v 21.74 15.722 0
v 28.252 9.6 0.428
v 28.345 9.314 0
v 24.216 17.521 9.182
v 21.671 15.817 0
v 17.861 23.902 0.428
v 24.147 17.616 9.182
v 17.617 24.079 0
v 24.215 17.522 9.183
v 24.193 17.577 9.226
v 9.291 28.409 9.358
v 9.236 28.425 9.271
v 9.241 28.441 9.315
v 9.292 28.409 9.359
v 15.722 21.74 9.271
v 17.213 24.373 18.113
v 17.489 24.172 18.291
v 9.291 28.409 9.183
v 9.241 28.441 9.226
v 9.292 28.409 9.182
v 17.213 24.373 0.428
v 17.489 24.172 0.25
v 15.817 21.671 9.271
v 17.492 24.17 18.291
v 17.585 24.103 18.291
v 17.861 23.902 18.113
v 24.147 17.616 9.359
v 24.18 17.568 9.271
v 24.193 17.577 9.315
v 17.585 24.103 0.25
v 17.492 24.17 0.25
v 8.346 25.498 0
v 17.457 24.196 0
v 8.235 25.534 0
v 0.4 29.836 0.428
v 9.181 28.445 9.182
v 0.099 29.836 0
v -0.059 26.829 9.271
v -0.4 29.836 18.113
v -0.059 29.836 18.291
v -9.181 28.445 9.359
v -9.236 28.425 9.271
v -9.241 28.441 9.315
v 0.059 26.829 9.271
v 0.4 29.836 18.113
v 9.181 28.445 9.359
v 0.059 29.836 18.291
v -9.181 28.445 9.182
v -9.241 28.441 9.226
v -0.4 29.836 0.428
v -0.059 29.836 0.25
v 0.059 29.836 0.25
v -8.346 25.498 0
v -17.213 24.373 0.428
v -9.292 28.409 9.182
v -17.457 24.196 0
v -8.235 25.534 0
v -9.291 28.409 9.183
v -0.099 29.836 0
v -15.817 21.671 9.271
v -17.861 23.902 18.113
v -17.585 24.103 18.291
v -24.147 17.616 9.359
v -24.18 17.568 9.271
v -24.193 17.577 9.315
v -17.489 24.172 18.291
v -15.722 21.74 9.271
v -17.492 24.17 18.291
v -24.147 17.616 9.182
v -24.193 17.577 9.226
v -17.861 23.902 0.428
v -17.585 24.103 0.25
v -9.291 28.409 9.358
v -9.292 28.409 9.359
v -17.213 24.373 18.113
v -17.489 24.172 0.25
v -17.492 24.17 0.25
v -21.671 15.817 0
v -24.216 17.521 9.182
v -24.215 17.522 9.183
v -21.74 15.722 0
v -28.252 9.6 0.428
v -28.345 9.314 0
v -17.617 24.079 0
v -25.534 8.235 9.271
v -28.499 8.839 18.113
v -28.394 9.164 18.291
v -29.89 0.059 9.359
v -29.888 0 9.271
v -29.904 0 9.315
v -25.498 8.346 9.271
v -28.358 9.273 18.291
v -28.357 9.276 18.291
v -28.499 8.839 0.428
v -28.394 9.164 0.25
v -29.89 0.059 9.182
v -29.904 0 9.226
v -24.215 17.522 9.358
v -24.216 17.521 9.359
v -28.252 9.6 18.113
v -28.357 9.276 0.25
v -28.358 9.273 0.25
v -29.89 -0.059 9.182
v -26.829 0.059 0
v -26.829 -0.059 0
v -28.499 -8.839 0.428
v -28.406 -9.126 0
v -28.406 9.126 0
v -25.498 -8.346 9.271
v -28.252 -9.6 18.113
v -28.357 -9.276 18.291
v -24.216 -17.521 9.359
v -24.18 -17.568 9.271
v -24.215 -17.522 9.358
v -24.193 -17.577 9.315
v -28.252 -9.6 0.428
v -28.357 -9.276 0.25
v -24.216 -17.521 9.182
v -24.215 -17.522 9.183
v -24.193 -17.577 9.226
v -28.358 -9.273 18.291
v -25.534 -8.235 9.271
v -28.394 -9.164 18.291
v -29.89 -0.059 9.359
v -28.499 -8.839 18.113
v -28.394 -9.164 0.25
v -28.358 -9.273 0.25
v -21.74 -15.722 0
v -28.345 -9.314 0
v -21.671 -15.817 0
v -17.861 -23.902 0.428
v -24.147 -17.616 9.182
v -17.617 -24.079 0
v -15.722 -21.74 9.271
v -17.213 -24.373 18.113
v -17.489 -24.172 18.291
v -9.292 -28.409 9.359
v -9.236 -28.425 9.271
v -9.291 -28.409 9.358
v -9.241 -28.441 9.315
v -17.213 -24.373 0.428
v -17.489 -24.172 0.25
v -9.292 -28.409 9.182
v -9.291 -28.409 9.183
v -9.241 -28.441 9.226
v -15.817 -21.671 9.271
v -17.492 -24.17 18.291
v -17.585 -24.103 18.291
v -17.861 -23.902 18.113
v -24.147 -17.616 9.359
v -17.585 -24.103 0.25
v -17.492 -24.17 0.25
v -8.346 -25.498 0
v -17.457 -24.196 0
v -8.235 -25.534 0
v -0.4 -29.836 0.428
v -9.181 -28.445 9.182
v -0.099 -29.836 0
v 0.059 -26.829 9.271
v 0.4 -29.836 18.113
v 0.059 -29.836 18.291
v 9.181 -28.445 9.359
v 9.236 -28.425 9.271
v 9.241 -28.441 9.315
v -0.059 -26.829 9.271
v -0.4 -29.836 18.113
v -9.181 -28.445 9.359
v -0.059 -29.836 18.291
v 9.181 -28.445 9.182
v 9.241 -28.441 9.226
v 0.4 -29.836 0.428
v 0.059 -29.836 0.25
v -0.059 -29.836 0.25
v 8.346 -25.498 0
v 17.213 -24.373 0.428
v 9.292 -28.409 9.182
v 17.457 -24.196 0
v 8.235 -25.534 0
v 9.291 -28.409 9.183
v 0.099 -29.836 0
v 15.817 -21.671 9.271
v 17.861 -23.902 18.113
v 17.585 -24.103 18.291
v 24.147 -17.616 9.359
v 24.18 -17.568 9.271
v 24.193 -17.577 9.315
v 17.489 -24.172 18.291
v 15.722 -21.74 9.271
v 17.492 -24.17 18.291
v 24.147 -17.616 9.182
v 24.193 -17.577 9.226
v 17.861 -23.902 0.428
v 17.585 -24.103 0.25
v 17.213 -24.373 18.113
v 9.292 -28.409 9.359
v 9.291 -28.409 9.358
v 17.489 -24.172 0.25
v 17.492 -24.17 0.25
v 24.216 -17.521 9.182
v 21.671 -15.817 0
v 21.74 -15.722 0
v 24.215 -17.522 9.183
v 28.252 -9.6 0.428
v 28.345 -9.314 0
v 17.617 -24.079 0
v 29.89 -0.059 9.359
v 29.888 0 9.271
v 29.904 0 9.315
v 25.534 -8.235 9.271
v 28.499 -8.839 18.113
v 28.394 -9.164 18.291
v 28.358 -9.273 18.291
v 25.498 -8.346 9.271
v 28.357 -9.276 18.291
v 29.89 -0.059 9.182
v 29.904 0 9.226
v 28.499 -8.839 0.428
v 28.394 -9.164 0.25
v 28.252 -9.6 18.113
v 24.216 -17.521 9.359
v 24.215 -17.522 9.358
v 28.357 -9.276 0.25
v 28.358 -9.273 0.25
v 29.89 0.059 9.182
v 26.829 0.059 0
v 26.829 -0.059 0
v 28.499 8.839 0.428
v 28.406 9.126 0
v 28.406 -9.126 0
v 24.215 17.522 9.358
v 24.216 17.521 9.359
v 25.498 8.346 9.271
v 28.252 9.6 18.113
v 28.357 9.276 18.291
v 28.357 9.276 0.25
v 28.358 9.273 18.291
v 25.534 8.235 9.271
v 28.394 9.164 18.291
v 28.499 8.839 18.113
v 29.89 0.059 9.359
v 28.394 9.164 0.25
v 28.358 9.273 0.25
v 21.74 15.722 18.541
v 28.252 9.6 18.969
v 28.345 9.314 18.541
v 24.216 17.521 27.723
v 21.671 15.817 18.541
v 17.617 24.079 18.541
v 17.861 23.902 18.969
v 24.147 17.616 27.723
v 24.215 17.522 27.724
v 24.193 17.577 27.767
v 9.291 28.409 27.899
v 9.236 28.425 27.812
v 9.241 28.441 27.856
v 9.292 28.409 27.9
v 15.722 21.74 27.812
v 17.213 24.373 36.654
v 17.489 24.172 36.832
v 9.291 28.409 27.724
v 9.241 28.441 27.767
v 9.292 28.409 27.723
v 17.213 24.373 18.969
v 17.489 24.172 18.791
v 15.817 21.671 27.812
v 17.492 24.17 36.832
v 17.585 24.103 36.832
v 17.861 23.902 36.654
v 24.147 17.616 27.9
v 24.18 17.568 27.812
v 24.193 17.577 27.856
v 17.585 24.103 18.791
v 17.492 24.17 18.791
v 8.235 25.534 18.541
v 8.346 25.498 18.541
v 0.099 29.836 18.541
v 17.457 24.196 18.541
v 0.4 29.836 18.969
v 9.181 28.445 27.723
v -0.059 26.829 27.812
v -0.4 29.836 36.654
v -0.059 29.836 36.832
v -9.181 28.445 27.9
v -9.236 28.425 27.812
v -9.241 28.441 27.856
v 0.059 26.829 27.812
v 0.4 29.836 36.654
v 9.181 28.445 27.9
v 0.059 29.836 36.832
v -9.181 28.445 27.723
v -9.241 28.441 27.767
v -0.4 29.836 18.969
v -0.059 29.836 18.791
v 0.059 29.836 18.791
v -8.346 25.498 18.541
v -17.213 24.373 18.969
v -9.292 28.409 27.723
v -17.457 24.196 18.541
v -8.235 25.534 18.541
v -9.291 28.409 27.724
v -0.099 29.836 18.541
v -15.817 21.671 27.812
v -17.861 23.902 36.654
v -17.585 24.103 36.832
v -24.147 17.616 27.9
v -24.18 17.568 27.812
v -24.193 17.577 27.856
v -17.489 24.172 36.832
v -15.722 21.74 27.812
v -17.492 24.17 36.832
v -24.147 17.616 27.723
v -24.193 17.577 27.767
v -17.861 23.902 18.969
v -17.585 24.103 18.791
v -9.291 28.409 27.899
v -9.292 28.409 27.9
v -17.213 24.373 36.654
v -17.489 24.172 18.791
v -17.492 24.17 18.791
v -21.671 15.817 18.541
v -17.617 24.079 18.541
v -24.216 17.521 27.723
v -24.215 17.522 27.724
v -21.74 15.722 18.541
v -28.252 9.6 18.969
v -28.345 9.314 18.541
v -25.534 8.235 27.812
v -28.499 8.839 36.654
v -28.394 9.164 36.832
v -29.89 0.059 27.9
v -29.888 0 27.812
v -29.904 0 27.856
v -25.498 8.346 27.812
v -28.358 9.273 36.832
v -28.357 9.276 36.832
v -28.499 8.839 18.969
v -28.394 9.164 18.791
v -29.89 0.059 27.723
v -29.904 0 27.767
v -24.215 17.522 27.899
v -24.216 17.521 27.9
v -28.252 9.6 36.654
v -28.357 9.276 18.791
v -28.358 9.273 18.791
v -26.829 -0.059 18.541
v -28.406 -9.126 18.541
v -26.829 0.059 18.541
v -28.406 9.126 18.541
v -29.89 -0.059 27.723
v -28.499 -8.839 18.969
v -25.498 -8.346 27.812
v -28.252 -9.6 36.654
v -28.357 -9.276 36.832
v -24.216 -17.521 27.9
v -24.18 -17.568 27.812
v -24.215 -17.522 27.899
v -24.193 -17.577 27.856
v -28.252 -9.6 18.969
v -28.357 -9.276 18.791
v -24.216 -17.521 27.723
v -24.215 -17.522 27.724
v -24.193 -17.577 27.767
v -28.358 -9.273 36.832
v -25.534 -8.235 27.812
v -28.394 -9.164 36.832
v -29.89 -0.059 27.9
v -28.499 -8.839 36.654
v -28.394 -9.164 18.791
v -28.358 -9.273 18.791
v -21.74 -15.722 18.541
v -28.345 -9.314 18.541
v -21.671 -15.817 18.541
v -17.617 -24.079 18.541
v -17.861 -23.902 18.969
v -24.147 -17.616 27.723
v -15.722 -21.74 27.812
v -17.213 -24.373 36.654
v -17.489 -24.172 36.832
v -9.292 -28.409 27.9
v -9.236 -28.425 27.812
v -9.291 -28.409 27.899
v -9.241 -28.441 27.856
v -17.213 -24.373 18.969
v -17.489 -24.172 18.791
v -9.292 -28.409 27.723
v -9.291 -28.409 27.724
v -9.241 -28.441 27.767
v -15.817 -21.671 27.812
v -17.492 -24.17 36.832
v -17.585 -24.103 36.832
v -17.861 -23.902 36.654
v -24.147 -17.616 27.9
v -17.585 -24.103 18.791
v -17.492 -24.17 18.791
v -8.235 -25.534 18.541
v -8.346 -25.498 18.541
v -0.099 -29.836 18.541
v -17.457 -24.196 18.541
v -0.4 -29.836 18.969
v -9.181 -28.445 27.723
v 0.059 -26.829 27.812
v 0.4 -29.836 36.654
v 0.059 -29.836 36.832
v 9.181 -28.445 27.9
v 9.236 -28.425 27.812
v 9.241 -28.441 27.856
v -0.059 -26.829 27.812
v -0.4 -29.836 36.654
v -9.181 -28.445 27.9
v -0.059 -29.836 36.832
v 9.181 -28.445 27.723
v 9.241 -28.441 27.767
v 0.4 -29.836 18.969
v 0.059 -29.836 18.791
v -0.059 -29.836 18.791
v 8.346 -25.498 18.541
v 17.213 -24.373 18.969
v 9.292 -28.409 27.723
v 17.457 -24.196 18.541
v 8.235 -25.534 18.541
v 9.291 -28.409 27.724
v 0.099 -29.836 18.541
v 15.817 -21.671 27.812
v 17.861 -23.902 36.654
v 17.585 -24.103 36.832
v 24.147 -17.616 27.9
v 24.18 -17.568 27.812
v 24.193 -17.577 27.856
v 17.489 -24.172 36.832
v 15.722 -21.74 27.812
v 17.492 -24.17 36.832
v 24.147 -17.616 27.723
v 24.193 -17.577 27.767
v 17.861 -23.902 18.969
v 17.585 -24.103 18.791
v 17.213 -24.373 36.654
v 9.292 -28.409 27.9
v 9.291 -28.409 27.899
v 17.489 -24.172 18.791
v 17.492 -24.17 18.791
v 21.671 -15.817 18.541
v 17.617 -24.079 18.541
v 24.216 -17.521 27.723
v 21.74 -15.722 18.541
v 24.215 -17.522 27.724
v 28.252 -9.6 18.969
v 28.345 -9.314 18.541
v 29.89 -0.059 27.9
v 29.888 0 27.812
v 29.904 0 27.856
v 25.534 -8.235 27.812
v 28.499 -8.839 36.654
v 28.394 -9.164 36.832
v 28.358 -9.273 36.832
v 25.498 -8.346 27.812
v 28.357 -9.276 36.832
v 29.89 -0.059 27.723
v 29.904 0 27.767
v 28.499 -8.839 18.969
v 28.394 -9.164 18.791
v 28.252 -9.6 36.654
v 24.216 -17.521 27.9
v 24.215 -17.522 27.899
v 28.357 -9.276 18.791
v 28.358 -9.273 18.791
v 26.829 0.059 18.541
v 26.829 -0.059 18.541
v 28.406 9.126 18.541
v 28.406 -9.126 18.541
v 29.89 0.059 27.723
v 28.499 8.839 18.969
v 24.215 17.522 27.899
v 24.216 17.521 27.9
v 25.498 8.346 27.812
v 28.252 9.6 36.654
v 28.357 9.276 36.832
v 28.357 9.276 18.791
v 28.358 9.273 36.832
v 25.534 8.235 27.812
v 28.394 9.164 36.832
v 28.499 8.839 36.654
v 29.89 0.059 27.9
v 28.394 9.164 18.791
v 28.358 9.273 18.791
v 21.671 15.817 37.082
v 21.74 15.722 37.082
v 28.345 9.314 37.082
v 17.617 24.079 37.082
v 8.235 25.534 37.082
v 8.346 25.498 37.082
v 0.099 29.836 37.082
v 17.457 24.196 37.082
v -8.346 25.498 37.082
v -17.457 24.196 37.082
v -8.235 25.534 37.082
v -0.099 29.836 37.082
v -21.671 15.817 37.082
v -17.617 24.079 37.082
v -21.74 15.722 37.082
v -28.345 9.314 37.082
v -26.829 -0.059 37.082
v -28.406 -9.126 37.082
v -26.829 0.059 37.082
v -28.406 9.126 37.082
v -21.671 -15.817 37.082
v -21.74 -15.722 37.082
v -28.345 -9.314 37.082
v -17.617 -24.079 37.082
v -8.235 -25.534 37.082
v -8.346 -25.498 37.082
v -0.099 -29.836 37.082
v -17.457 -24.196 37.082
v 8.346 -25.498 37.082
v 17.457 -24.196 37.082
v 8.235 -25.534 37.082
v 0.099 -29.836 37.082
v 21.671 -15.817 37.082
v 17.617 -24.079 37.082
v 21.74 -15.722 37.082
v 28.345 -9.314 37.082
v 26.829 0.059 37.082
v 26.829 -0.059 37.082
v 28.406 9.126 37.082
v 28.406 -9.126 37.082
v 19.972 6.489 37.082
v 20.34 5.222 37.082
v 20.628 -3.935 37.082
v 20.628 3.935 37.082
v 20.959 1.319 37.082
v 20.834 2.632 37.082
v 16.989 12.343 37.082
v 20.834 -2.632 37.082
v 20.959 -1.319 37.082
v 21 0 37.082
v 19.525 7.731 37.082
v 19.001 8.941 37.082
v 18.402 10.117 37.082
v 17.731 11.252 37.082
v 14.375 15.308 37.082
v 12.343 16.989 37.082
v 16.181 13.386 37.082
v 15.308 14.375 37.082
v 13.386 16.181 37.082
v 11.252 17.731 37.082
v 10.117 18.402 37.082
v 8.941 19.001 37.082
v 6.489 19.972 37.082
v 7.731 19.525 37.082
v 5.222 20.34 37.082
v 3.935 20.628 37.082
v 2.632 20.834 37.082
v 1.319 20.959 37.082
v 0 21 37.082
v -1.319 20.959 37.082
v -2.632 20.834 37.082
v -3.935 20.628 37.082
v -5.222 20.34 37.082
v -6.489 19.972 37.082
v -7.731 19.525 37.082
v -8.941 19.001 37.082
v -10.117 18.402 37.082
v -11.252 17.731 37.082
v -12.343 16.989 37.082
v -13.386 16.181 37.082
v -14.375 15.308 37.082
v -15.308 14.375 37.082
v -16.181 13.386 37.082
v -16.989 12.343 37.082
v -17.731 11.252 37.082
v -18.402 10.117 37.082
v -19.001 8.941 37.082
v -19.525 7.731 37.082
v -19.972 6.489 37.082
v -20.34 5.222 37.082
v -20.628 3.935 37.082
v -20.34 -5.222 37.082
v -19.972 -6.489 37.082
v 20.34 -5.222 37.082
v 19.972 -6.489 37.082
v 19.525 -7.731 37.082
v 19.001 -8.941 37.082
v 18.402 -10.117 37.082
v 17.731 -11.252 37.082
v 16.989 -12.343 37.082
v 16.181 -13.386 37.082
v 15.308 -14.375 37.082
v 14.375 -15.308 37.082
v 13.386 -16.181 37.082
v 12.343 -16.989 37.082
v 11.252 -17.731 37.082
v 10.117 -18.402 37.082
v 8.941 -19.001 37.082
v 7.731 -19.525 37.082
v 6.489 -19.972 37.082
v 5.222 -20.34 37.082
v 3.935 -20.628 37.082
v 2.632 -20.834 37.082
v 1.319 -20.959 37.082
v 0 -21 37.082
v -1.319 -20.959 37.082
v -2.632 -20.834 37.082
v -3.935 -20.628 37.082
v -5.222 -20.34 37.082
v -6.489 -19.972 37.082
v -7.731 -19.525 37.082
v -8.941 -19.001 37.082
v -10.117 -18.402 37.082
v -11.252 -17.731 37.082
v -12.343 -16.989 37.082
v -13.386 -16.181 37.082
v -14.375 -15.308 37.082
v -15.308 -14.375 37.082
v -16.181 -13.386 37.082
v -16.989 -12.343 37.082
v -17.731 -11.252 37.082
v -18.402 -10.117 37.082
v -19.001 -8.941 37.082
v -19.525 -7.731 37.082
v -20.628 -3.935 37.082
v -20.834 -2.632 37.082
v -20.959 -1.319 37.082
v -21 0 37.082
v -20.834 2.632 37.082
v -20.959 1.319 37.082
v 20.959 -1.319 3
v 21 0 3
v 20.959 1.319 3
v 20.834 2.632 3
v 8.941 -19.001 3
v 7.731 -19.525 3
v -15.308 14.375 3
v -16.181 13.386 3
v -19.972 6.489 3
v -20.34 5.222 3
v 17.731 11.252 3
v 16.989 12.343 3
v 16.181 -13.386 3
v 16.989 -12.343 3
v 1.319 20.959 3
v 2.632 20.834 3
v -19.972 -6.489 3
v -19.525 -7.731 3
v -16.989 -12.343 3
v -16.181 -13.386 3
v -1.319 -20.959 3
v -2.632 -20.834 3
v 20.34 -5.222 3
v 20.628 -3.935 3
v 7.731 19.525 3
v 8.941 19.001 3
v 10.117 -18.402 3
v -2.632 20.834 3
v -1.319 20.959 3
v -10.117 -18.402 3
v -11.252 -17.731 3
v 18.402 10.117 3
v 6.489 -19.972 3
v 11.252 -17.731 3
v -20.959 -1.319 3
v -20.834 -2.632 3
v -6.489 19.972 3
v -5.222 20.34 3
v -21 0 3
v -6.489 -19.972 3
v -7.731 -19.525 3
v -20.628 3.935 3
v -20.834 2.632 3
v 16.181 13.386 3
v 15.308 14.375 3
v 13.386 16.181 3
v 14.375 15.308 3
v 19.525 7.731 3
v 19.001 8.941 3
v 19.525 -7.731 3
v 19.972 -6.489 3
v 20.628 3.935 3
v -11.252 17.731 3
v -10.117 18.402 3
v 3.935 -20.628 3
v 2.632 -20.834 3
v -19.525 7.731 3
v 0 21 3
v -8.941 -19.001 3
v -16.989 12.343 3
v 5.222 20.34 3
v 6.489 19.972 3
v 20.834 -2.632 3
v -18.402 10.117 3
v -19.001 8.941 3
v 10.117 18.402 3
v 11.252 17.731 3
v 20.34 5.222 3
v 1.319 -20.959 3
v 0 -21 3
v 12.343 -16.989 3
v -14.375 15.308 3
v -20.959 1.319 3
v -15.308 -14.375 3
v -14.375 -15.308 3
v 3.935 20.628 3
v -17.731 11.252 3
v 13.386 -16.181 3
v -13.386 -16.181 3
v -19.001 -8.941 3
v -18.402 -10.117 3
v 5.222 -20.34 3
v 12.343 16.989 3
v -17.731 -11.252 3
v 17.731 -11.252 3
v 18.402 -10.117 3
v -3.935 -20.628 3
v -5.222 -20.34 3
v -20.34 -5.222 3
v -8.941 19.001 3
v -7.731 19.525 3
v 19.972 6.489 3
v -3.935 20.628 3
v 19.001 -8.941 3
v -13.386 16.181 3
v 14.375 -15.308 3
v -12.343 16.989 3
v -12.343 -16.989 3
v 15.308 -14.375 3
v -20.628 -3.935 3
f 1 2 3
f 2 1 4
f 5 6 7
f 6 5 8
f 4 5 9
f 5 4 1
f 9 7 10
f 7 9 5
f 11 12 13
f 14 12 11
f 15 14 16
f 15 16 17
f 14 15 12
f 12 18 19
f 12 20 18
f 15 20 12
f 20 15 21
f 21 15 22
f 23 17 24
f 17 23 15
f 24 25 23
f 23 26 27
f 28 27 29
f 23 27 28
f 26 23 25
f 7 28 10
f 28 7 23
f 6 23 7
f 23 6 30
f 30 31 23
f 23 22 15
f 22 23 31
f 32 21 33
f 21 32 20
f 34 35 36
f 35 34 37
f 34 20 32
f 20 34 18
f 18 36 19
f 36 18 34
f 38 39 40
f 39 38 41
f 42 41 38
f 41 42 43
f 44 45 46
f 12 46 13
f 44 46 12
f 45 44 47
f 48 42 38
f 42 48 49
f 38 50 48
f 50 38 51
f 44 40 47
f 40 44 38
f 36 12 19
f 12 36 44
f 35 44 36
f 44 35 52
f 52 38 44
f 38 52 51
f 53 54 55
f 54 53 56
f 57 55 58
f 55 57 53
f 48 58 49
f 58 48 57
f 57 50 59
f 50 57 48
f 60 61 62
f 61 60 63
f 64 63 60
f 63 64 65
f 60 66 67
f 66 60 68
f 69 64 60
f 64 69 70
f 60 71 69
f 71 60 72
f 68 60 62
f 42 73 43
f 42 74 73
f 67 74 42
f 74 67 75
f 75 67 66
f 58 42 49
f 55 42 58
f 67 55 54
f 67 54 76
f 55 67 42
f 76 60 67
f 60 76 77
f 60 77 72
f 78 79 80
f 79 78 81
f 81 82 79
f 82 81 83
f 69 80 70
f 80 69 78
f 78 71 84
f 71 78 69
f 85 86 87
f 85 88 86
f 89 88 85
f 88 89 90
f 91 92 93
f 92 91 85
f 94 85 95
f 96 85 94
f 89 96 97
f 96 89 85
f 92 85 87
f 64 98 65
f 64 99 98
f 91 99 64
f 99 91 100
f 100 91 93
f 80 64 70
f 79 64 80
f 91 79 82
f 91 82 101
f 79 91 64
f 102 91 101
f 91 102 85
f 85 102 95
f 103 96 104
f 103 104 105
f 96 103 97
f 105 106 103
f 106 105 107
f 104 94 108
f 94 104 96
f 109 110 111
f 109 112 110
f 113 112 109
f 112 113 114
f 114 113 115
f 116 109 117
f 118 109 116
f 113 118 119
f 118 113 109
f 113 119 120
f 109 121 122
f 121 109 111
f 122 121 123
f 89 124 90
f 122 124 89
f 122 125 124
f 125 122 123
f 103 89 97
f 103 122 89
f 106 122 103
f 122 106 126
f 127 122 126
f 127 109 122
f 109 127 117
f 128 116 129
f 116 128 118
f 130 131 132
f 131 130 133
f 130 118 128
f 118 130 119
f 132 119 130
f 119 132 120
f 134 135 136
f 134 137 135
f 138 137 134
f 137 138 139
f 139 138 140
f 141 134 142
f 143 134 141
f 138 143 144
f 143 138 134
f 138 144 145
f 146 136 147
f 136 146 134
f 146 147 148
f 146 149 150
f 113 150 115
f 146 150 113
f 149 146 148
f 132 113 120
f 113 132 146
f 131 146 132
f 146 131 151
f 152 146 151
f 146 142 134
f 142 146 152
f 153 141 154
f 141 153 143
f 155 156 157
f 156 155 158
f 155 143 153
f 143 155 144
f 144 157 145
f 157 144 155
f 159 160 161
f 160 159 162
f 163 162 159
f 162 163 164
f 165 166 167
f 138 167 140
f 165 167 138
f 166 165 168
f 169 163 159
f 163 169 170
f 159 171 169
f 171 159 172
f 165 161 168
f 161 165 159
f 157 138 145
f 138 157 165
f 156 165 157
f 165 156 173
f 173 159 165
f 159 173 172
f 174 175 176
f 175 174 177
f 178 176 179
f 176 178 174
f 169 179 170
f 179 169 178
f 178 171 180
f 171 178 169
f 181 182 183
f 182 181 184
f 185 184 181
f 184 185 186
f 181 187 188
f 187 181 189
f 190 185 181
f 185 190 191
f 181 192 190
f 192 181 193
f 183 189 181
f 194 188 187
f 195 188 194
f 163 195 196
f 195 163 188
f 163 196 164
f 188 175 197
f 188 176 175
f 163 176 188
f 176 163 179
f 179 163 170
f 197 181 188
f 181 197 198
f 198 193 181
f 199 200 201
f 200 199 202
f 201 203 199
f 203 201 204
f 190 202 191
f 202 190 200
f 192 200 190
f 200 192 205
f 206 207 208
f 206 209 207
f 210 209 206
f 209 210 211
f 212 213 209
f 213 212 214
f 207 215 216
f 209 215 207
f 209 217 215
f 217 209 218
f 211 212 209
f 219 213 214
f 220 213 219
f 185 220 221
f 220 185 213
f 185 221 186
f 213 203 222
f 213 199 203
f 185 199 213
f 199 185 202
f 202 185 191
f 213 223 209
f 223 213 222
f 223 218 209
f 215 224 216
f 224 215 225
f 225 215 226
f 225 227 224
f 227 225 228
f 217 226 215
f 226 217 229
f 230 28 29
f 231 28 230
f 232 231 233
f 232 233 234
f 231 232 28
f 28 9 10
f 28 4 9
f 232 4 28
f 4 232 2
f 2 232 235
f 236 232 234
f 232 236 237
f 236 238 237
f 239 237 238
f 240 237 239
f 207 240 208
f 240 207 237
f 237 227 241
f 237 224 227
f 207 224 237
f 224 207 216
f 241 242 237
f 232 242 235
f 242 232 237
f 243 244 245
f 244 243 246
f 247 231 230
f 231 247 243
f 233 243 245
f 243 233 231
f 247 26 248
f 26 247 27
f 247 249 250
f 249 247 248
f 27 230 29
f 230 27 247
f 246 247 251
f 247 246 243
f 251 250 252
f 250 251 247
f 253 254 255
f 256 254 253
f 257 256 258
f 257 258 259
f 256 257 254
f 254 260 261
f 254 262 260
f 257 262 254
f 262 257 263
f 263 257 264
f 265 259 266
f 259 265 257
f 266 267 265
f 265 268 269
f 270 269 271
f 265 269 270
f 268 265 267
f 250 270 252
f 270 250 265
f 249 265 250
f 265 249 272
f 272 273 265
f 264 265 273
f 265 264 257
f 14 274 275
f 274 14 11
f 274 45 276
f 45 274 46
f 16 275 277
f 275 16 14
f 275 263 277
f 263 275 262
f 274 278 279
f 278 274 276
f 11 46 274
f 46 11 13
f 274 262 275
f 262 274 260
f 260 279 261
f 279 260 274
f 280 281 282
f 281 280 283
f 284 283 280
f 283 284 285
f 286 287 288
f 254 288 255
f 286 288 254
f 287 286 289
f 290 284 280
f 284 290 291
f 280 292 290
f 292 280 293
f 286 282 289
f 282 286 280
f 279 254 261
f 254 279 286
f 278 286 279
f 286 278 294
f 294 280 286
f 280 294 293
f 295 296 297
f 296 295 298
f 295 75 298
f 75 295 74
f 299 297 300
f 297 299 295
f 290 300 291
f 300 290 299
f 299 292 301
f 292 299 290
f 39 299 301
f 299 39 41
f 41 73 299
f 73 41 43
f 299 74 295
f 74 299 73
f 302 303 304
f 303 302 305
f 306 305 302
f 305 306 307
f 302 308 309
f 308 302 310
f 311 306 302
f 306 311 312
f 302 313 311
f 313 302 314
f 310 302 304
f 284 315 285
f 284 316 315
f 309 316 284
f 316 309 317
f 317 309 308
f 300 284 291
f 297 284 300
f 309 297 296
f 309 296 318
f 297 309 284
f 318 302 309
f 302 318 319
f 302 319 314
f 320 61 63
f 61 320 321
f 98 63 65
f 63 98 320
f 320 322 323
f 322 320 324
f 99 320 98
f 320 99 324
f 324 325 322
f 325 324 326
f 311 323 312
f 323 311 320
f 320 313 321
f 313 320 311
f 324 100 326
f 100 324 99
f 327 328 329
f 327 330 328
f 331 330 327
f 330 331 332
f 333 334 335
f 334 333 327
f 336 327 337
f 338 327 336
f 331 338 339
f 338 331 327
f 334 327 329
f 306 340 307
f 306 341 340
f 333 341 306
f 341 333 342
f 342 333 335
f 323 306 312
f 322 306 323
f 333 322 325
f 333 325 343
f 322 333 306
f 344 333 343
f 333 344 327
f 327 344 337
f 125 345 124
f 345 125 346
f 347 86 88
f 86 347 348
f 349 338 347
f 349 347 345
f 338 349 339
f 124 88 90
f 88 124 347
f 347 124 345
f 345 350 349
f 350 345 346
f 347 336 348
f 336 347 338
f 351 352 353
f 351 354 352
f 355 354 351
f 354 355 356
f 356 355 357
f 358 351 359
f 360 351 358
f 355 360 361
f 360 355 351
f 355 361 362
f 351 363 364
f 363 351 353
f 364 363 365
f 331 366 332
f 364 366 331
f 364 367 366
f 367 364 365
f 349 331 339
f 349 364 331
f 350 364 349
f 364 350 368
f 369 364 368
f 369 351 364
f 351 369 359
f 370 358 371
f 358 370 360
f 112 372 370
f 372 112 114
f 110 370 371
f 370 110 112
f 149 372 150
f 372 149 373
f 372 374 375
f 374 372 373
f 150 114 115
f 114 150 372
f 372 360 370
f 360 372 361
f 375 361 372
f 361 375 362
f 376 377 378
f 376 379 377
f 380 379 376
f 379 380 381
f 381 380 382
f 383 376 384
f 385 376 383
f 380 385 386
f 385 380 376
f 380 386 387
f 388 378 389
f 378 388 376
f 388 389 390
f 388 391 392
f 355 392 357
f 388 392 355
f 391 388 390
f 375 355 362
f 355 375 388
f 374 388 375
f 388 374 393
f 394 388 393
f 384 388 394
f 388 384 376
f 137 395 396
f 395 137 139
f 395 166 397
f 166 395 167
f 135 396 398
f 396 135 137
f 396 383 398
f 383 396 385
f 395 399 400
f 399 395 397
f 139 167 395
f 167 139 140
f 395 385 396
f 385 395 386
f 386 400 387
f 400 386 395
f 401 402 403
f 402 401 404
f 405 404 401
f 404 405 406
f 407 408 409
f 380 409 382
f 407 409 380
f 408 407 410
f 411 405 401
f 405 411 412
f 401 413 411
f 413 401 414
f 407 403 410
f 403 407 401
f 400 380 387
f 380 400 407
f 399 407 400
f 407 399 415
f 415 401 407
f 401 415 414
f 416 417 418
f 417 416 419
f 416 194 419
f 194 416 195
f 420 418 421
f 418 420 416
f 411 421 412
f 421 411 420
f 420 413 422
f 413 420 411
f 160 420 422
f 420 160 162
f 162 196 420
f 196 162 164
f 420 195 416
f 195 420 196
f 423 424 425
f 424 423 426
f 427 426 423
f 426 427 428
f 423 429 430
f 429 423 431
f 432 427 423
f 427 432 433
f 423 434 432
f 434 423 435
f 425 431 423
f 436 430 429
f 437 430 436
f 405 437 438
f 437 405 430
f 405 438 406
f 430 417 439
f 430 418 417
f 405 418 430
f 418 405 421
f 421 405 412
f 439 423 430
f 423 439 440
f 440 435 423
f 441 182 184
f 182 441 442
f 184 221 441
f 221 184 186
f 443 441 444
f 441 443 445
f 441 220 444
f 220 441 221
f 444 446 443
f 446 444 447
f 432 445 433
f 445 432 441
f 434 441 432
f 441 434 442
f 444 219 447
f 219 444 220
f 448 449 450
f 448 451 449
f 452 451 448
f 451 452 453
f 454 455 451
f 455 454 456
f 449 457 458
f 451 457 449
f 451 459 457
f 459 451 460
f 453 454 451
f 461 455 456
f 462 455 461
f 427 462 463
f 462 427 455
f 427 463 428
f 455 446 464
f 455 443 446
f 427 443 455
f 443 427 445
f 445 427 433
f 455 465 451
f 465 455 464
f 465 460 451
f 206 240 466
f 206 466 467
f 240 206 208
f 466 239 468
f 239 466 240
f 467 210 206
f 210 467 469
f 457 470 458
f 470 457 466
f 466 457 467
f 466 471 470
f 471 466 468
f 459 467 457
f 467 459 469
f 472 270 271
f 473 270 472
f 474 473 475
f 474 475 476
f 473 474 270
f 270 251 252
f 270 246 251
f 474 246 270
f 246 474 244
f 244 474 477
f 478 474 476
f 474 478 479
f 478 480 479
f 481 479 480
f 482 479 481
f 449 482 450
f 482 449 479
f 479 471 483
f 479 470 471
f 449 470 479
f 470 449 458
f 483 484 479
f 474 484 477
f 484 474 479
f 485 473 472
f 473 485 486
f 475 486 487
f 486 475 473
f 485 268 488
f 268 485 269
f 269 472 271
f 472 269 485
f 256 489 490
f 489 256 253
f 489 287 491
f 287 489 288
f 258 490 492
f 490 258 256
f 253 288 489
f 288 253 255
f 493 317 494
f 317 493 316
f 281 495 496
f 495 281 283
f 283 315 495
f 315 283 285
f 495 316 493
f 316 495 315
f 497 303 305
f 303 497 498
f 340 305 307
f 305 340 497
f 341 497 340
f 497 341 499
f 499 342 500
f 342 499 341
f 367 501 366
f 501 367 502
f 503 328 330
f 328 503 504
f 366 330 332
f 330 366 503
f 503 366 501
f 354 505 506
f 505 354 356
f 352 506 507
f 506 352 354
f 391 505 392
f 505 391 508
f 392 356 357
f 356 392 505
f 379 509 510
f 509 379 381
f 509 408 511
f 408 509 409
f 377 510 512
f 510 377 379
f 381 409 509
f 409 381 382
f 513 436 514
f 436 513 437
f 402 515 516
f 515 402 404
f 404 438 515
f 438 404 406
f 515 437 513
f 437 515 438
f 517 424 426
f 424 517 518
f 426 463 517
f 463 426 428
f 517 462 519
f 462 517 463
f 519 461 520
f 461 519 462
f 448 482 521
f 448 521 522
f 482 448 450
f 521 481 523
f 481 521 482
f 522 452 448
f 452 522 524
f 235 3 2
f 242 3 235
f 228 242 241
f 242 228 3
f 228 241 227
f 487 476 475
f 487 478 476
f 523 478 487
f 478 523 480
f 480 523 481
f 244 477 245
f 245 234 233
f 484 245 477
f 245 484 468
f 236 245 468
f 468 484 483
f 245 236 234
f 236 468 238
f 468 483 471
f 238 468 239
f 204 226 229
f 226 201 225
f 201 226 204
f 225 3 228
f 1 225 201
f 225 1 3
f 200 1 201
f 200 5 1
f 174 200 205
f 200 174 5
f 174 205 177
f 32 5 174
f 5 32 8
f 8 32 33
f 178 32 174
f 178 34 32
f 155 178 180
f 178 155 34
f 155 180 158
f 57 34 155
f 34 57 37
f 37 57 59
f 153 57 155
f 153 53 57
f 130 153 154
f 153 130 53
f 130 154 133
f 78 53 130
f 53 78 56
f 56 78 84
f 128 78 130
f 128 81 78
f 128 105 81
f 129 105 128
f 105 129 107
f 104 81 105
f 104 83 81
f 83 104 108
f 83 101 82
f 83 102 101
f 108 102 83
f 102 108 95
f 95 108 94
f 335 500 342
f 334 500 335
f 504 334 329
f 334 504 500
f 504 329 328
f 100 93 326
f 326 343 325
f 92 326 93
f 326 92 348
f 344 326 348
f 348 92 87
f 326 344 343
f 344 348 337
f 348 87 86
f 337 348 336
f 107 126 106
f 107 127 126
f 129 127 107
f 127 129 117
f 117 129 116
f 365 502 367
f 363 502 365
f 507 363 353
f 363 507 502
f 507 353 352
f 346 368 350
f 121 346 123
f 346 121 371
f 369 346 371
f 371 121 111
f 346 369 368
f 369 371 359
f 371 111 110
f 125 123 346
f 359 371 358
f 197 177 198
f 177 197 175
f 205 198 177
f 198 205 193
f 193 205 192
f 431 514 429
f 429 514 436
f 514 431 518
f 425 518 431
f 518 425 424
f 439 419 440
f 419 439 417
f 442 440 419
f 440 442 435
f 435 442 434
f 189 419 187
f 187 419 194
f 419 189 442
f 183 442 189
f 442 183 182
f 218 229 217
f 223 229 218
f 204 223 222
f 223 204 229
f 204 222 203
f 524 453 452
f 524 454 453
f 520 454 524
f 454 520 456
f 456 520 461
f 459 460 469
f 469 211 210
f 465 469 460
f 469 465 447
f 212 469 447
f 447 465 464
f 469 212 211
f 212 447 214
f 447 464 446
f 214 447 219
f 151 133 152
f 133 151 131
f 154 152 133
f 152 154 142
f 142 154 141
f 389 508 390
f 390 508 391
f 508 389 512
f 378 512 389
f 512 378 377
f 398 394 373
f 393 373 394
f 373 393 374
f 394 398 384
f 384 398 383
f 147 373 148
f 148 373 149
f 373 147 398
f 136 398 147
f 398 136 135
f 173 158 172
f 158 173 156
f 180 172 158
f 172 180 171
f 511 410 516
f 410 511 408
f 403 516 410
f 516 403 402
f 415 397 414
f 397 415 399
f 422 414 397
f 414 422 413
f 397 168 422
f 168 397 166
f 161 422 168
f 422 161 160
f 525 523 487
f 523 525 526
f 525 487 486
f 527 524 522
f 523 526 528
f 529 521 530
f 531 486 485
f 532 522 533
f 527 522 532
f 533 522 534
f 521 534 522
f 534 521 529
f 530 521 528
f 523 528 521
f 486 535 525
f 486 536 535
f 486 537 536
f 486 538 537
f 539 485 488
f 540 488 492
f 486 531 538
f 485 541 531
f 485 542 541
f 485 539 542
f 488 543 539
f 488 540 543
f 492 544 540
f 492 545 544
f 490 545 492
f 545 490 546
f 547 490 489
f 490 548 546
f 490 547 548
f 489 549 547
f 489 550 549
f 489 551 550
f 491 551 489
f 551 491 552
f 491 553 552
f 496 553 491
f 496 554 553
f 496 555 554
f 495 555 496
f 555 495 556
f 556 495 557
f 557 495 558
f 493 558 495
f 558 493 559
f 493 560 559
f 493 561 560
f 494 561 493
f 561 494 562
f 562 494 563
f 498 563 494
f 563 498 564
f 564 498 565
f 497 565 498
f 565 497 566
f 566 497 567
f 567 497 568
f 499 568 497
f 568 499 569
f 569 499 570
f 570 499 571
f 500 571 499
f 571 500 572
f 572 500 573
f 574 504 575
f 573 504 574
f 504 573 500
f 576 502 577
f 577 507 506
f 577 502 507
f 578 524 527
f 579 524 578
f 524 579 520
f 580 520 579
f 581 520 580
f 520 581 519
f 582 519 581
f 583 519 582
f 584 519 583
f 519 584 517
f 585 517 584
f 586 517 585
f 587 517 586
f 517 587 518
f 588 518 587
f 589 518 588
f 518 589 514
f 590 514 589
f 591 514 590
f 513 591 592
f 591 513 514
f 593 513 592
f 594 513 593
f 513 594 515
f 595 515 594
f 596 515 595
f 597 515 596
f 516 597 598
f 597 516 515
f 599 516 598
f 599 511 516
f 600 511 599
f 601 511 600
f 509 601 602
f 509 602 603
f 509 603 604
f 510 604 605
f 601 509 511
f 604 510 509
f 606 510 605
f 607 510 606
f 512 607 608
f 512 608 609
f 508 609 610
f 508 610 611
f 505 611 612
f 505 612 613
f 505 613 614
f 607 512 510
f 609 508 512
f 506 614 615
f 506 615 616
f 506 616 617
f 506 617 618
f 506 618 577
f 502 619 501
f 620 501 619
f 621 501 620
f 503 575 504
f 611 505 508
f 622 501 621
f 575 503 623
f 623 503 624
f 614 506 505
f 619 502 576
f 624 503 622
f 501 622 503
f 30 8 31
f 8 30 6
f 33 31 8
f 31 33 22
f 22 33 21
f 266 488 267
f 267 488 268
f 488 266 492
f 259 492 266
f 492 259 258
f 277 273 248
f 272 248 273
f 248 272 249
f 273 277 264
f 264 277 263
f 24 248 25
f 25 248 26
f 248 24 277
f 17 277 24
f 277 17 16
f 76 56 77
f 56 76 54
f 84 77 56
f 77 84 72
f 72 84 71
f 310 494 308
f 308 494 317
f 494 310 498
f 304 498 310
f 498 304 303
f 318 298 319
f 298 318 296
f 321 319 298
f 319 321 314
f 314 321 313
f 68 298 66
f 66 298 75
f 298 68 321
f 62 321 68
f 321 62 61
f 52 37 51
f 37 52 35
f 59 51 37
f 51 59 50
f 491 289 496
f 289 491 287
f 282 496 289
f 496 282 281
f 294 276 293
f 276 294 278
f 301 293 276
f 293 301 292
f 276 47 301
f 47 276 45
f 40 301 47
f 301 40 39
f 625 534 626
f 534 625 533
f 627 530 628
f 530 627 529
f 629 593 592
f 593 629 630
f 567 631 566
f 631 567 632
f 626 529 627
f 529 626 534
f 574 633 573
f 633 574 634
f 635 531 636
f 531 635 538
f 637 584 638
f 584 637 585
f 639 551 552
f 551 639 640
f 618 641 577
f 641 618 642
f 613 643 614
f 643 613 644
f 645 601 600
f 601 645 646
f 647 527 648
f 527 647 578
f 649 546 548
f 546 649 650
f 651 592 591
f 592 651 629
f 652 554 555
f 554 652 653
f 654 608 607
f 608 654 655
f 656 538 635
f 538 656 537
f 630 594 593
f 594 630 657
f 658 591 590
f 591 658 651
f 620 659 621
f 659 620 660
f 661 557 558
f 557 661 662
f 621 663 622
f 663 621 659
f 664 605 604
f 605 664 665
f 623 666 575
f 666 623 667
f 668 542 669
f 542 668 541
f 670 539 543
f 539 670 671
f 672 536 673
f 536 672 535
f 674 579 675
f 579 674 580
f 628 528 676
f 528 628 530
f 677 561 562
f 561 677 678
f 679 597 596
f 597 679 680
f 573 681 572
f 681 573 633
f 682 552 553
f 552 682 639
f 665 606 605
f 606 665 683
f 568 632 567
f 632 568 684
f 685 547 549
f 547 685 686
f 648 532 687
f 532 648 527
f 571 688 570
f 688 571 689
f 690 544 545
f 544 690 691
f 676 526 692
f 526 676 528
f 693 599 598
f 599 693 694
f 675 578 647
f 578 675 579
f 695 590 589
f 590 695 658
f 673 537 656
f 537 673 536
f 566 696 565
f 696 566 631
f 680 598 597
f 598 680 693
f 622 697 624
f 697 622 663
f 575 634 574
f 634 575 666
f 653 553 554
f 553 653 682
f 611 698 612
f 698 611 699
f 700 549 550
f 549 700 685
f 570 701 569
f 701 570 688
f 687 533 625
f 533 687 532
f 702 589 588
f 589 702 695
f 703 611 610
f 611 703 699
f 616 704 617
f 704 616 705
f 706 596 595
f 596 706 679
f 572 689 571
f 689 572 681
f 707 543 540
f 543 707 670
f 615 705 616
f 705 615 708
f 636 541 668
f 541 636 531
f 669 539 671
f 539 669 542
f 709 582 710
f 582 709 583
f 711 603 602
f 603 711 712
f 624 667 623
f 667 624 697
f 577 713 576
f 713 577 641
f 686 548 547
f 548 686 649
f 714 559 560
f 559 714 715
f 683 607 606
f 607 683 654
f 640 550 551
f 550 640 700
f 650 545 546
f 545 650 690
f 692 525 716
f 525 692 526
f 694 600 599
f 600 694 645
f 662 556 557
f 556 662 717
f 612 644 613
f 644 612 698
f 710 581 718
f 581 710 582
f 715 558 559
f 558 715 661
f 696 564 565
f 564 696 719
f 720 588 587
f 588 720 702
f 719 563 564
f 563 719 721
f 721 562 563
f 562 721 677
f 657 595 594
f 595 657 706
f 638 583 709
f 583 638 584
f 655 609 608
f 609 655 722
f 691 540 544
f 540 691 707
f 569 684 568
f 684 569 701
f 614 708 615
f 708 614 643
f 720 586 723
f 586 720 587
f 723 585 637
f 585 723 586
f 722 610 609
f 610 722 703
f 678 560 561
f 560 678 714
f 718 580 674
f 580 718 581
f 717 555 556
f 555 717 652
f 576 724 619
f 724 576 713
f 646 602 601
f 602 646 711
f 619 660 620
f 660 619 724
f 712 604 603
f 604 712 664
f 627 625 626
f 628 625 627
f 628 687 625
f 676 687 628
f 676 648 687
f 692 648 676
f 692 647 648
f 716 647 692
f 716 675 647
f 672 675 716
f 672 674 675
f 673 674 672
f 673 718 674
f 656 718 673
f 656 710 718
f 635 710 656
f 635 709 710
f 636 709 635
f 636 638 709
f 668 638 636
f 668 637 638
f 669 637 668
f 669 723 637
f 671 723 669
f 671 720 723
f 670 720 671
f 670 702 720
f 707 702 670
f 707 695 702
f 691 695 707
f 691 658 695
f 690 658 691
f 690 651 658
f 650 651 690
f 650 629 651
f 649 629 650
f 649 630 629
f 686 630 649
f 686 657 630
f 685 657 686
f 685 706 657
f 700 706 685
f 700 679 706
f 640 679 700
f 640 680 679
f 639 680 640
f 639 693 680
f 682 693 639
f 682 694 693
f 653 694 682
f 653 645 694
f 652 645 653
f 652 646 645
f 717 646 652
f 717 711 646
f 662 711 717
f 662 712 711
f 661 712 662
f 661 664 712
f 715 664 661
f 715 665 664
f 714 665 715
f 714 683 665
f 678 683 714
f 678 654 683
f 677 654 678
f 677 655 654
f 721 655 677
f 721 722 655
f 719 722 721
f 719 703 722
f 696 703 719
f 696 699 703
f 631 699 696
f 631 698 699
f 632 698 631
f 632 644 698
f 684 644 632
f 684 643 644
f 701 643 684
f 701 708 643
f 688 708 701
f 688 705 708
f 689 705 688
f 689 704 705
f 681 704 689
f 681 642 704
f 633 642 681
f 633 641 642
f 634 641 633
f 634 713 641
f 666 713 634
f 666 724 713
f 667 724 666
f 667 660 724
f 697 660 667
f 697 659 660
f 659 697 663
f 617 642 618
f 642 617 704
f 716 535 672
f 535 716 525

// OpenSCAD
//
// a parametric pot
//
// inspired by:
// https://www.thingiverse.com/thing:2918926
//

// user parameters
N = 10; // number of pyramid holes in a floor
radius = 30; // external radius
inner_radius = 21; // internal radius
num_floors = 4; // number of pyramid floors
bottom_width = 3; // width of the bottom layer

// do not edit below this line
angle_step = 360 / N;
floor_step = 30 * sin(angle_step/2);

echo ("total height:", floor_step * num_floors);

module pyramid(rad, ang) {
    hull () {
        rotate (ang/2) translate ([rad, 0, 0])
            sphere (0.1);
        rotate (-ang/2) translate ([rad, 0, 0])
            sphere (0.1);
        translate ([rad, 0, -rad * sin(ang/2)])
            sphere (0.1);
        translate ([rad, 0, rad * sin(ang/2)])
            sphere (0.1);
        translate ([rad * (1-sin(ang/2)/3),0, 0]) sphere(0.1);
    }
}

module pyramid_cut_floor (
  radius,
  angle_step,
  floor_step
) {
  for (ang = [angle_step:angle_step:360]) {
    rotate ([0,0,ang])
      hull () {
        pyramid (radius, angle_step);
        scale (2)
          pyramid (radius, angle_step);
      }
    translate ([0, 0, floor_step])
      rotate ([0, 0, ang + angle_step / 2])
        hull () {
          pyramid (radius, angle_step);
          scale (2)
            pyramid (radius, angle_step);
        }
  }
}

module pyramid_cuts (
  radius,
  angle_step,
  floor_step,
  num_floors
) {
  total_height = num_floors * floor_step;
  for (h = [0: floor_step*2: total_height])
    translate ([0, 0, h])
      pyramid_cut_floor (
        radius,
        angle_step,
        floor_step);
}

difference () {
  linear_extrude (num_floors * floor_step)
    circle (radius);
  pyramid_cuts (
    radius,
    angle_step,
    floor_step,
    num_floors);
  translate ([0,0,bottom_width])
  linear_extrude (num_floors * floor_step)
    circle (inner_radius, $fn=100);
}
